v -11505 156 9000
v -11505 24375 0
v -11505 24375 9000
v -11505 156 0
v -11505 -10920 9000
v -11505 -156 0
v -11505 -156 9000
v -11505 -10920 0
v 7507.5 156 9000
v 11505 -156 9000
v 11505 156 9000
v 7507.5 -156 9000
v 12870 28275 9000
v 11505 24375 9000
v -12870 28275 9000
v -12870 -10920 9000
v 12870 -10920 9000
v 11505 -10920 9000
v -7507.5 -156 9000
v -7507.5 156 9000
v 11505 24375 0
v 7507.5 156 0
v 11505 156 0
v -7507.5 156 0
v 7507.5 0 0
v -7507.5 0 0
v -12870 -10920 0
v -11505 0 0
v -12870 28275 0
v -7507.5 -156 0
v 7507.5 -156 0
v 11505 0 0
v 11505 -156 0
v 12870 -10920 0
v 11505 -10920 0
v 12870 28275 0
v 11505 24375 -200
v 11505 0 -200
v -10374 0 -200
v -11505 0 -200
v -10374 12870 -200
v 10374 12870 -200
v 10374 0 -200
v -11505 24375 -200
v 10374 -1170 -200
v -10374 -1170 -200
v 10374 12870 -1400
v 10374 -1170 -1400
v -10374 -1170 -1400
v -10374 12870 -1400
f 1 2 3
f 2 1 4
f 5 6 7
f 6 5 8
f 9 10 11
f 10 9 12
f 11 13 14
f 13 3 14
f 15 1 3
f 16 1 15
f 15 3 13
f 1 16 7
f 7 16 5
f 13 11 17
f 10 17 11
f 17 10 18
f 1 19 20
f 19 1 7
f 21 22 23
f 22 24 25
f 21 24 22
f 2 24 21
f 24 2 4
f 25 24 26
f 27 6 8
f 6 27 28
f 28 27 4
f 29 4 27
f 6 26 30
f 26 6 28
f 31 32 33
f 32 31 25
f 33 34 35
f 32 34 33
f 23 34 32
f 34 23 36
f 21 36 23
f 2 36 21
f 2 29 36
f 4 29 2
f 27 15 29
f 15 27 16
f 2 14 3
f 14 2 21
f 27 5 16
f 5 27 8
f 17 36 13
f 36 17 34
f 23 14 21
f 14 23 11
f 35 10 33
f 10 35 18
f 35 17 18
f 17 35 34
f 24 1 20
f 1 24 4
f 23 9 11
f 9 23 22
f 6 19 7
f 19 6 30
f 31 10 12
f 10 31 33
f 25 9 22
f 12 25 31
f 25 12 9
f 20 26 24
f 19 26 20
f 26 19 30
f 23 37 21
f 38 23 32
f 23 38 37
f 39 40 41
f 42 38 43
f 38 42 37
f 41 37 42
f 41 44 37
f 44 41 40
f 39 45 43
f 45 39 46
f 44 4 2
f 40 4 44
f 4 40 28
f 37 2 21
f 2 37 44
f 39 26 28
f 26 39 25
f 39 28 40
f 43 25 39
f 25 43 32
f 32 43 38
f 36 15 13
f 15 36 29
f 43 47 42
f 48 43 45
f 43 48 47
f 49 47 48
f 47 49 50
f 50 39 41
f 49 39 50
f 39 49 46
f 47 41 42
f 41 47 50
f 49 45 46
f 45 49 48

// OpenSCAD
// Theatre - a proscenium theatre's shell: the stage floor, its side and upstage walls,
// the proscenium wall with its opening, the pit below the stage, and the side walls
// running downstage into the house.
//
// Frame: millimetres; the origin is the plaster line's centre on the stage floor;
// +x is to the right as the house sees the stage, +y upstage, +z up.
//
// Every default is a measurement of one real stage house, traced from its plan
// (a few boxes, not the outline). The house beyond the side walls, the fly tower
// and the seating are not drawn.

// Customizer parameters
stage_width = 23010;       // [8000:100:40000] Stage floor, wall to wall
stage_depth = 24375;       // [6000:100:40000] Plaster line to the upstage wall
wall_height = 9000;        // [4000:100:20000] Walls, from the stage floor
house_depth = 10920;       // [0:100:40000] How far the side walls run downstage of the plaster line
proscenium_width = 15015;  // [4000:100:40000] The proscenium opening
proscenium_height = 9000;  // [3000:100:20000] The opening's height; the wall's, for no header
pit_width = 20748;         // [0:100:40000] The pit below the stage
pit_length = 14040;        // [0:100:40000] The pit, downstage to upstage
pit_depth = 1200;          // [0:50:4000] The pit, below the stage floor's underside

/* [Hidden] */
stage_floor = 200;         // the stage floor's thickness
side_wall = 1365;          // the side walls' thickness
upstage_wall = 3900;       // the upstage wall's thickness
proscenium_wall = 312;     // the proscenium wall's thickness, centred on the plaster line
pit_front = 1170;          // how far downstage of the plaster line the pit begins

half = stage_width / 2;
opening = min(proscenium_width, stage_width) / 2;
// The opening cut from the floor to its height, or past the wall's top when it has no header.
cut = proscenium_height >= wall_height ? wall_height + 2 : proscenium_height;

module stage_floor() {
    translate([-half, 0, -stage_floor]) cube([stage_width, stage_depth, stage_floor]);
}

module side_walls() {
    for (x = [-half - side_wall, half])
        translate([x, -house_depth, 0]) cube([side_wall, house_depth + stage_depth, wall_height]);
}

module upstage_wall() {
    translate([-half - side_wall, stage_depth, 0])
        cube([stage_width + 2 * side_wall, upstage_wall, wall_height]);
}

module proscenium() {
    difference() {
        translate([-half, -proscenium_wall / 2, 0]) cube([stage_width, proscenium_wall, wall_height]);
        translate([-opening, -proscenium_wall, -1]) cube([2 * opening, 2 * proscenium_wall, cut + 1]);
    }
}

module pit() {
    if (pit_width > 0 && pit_length > 0 && pit_depth > 0)
        translate([-pit_width / 2, -pit_front, -stage_floor - pit_depth])
            cube([pit_width, pit_length, pit_depth]);
}

stage_floor();
side_walls();
upstage_wall();
proscenium();
pit();
